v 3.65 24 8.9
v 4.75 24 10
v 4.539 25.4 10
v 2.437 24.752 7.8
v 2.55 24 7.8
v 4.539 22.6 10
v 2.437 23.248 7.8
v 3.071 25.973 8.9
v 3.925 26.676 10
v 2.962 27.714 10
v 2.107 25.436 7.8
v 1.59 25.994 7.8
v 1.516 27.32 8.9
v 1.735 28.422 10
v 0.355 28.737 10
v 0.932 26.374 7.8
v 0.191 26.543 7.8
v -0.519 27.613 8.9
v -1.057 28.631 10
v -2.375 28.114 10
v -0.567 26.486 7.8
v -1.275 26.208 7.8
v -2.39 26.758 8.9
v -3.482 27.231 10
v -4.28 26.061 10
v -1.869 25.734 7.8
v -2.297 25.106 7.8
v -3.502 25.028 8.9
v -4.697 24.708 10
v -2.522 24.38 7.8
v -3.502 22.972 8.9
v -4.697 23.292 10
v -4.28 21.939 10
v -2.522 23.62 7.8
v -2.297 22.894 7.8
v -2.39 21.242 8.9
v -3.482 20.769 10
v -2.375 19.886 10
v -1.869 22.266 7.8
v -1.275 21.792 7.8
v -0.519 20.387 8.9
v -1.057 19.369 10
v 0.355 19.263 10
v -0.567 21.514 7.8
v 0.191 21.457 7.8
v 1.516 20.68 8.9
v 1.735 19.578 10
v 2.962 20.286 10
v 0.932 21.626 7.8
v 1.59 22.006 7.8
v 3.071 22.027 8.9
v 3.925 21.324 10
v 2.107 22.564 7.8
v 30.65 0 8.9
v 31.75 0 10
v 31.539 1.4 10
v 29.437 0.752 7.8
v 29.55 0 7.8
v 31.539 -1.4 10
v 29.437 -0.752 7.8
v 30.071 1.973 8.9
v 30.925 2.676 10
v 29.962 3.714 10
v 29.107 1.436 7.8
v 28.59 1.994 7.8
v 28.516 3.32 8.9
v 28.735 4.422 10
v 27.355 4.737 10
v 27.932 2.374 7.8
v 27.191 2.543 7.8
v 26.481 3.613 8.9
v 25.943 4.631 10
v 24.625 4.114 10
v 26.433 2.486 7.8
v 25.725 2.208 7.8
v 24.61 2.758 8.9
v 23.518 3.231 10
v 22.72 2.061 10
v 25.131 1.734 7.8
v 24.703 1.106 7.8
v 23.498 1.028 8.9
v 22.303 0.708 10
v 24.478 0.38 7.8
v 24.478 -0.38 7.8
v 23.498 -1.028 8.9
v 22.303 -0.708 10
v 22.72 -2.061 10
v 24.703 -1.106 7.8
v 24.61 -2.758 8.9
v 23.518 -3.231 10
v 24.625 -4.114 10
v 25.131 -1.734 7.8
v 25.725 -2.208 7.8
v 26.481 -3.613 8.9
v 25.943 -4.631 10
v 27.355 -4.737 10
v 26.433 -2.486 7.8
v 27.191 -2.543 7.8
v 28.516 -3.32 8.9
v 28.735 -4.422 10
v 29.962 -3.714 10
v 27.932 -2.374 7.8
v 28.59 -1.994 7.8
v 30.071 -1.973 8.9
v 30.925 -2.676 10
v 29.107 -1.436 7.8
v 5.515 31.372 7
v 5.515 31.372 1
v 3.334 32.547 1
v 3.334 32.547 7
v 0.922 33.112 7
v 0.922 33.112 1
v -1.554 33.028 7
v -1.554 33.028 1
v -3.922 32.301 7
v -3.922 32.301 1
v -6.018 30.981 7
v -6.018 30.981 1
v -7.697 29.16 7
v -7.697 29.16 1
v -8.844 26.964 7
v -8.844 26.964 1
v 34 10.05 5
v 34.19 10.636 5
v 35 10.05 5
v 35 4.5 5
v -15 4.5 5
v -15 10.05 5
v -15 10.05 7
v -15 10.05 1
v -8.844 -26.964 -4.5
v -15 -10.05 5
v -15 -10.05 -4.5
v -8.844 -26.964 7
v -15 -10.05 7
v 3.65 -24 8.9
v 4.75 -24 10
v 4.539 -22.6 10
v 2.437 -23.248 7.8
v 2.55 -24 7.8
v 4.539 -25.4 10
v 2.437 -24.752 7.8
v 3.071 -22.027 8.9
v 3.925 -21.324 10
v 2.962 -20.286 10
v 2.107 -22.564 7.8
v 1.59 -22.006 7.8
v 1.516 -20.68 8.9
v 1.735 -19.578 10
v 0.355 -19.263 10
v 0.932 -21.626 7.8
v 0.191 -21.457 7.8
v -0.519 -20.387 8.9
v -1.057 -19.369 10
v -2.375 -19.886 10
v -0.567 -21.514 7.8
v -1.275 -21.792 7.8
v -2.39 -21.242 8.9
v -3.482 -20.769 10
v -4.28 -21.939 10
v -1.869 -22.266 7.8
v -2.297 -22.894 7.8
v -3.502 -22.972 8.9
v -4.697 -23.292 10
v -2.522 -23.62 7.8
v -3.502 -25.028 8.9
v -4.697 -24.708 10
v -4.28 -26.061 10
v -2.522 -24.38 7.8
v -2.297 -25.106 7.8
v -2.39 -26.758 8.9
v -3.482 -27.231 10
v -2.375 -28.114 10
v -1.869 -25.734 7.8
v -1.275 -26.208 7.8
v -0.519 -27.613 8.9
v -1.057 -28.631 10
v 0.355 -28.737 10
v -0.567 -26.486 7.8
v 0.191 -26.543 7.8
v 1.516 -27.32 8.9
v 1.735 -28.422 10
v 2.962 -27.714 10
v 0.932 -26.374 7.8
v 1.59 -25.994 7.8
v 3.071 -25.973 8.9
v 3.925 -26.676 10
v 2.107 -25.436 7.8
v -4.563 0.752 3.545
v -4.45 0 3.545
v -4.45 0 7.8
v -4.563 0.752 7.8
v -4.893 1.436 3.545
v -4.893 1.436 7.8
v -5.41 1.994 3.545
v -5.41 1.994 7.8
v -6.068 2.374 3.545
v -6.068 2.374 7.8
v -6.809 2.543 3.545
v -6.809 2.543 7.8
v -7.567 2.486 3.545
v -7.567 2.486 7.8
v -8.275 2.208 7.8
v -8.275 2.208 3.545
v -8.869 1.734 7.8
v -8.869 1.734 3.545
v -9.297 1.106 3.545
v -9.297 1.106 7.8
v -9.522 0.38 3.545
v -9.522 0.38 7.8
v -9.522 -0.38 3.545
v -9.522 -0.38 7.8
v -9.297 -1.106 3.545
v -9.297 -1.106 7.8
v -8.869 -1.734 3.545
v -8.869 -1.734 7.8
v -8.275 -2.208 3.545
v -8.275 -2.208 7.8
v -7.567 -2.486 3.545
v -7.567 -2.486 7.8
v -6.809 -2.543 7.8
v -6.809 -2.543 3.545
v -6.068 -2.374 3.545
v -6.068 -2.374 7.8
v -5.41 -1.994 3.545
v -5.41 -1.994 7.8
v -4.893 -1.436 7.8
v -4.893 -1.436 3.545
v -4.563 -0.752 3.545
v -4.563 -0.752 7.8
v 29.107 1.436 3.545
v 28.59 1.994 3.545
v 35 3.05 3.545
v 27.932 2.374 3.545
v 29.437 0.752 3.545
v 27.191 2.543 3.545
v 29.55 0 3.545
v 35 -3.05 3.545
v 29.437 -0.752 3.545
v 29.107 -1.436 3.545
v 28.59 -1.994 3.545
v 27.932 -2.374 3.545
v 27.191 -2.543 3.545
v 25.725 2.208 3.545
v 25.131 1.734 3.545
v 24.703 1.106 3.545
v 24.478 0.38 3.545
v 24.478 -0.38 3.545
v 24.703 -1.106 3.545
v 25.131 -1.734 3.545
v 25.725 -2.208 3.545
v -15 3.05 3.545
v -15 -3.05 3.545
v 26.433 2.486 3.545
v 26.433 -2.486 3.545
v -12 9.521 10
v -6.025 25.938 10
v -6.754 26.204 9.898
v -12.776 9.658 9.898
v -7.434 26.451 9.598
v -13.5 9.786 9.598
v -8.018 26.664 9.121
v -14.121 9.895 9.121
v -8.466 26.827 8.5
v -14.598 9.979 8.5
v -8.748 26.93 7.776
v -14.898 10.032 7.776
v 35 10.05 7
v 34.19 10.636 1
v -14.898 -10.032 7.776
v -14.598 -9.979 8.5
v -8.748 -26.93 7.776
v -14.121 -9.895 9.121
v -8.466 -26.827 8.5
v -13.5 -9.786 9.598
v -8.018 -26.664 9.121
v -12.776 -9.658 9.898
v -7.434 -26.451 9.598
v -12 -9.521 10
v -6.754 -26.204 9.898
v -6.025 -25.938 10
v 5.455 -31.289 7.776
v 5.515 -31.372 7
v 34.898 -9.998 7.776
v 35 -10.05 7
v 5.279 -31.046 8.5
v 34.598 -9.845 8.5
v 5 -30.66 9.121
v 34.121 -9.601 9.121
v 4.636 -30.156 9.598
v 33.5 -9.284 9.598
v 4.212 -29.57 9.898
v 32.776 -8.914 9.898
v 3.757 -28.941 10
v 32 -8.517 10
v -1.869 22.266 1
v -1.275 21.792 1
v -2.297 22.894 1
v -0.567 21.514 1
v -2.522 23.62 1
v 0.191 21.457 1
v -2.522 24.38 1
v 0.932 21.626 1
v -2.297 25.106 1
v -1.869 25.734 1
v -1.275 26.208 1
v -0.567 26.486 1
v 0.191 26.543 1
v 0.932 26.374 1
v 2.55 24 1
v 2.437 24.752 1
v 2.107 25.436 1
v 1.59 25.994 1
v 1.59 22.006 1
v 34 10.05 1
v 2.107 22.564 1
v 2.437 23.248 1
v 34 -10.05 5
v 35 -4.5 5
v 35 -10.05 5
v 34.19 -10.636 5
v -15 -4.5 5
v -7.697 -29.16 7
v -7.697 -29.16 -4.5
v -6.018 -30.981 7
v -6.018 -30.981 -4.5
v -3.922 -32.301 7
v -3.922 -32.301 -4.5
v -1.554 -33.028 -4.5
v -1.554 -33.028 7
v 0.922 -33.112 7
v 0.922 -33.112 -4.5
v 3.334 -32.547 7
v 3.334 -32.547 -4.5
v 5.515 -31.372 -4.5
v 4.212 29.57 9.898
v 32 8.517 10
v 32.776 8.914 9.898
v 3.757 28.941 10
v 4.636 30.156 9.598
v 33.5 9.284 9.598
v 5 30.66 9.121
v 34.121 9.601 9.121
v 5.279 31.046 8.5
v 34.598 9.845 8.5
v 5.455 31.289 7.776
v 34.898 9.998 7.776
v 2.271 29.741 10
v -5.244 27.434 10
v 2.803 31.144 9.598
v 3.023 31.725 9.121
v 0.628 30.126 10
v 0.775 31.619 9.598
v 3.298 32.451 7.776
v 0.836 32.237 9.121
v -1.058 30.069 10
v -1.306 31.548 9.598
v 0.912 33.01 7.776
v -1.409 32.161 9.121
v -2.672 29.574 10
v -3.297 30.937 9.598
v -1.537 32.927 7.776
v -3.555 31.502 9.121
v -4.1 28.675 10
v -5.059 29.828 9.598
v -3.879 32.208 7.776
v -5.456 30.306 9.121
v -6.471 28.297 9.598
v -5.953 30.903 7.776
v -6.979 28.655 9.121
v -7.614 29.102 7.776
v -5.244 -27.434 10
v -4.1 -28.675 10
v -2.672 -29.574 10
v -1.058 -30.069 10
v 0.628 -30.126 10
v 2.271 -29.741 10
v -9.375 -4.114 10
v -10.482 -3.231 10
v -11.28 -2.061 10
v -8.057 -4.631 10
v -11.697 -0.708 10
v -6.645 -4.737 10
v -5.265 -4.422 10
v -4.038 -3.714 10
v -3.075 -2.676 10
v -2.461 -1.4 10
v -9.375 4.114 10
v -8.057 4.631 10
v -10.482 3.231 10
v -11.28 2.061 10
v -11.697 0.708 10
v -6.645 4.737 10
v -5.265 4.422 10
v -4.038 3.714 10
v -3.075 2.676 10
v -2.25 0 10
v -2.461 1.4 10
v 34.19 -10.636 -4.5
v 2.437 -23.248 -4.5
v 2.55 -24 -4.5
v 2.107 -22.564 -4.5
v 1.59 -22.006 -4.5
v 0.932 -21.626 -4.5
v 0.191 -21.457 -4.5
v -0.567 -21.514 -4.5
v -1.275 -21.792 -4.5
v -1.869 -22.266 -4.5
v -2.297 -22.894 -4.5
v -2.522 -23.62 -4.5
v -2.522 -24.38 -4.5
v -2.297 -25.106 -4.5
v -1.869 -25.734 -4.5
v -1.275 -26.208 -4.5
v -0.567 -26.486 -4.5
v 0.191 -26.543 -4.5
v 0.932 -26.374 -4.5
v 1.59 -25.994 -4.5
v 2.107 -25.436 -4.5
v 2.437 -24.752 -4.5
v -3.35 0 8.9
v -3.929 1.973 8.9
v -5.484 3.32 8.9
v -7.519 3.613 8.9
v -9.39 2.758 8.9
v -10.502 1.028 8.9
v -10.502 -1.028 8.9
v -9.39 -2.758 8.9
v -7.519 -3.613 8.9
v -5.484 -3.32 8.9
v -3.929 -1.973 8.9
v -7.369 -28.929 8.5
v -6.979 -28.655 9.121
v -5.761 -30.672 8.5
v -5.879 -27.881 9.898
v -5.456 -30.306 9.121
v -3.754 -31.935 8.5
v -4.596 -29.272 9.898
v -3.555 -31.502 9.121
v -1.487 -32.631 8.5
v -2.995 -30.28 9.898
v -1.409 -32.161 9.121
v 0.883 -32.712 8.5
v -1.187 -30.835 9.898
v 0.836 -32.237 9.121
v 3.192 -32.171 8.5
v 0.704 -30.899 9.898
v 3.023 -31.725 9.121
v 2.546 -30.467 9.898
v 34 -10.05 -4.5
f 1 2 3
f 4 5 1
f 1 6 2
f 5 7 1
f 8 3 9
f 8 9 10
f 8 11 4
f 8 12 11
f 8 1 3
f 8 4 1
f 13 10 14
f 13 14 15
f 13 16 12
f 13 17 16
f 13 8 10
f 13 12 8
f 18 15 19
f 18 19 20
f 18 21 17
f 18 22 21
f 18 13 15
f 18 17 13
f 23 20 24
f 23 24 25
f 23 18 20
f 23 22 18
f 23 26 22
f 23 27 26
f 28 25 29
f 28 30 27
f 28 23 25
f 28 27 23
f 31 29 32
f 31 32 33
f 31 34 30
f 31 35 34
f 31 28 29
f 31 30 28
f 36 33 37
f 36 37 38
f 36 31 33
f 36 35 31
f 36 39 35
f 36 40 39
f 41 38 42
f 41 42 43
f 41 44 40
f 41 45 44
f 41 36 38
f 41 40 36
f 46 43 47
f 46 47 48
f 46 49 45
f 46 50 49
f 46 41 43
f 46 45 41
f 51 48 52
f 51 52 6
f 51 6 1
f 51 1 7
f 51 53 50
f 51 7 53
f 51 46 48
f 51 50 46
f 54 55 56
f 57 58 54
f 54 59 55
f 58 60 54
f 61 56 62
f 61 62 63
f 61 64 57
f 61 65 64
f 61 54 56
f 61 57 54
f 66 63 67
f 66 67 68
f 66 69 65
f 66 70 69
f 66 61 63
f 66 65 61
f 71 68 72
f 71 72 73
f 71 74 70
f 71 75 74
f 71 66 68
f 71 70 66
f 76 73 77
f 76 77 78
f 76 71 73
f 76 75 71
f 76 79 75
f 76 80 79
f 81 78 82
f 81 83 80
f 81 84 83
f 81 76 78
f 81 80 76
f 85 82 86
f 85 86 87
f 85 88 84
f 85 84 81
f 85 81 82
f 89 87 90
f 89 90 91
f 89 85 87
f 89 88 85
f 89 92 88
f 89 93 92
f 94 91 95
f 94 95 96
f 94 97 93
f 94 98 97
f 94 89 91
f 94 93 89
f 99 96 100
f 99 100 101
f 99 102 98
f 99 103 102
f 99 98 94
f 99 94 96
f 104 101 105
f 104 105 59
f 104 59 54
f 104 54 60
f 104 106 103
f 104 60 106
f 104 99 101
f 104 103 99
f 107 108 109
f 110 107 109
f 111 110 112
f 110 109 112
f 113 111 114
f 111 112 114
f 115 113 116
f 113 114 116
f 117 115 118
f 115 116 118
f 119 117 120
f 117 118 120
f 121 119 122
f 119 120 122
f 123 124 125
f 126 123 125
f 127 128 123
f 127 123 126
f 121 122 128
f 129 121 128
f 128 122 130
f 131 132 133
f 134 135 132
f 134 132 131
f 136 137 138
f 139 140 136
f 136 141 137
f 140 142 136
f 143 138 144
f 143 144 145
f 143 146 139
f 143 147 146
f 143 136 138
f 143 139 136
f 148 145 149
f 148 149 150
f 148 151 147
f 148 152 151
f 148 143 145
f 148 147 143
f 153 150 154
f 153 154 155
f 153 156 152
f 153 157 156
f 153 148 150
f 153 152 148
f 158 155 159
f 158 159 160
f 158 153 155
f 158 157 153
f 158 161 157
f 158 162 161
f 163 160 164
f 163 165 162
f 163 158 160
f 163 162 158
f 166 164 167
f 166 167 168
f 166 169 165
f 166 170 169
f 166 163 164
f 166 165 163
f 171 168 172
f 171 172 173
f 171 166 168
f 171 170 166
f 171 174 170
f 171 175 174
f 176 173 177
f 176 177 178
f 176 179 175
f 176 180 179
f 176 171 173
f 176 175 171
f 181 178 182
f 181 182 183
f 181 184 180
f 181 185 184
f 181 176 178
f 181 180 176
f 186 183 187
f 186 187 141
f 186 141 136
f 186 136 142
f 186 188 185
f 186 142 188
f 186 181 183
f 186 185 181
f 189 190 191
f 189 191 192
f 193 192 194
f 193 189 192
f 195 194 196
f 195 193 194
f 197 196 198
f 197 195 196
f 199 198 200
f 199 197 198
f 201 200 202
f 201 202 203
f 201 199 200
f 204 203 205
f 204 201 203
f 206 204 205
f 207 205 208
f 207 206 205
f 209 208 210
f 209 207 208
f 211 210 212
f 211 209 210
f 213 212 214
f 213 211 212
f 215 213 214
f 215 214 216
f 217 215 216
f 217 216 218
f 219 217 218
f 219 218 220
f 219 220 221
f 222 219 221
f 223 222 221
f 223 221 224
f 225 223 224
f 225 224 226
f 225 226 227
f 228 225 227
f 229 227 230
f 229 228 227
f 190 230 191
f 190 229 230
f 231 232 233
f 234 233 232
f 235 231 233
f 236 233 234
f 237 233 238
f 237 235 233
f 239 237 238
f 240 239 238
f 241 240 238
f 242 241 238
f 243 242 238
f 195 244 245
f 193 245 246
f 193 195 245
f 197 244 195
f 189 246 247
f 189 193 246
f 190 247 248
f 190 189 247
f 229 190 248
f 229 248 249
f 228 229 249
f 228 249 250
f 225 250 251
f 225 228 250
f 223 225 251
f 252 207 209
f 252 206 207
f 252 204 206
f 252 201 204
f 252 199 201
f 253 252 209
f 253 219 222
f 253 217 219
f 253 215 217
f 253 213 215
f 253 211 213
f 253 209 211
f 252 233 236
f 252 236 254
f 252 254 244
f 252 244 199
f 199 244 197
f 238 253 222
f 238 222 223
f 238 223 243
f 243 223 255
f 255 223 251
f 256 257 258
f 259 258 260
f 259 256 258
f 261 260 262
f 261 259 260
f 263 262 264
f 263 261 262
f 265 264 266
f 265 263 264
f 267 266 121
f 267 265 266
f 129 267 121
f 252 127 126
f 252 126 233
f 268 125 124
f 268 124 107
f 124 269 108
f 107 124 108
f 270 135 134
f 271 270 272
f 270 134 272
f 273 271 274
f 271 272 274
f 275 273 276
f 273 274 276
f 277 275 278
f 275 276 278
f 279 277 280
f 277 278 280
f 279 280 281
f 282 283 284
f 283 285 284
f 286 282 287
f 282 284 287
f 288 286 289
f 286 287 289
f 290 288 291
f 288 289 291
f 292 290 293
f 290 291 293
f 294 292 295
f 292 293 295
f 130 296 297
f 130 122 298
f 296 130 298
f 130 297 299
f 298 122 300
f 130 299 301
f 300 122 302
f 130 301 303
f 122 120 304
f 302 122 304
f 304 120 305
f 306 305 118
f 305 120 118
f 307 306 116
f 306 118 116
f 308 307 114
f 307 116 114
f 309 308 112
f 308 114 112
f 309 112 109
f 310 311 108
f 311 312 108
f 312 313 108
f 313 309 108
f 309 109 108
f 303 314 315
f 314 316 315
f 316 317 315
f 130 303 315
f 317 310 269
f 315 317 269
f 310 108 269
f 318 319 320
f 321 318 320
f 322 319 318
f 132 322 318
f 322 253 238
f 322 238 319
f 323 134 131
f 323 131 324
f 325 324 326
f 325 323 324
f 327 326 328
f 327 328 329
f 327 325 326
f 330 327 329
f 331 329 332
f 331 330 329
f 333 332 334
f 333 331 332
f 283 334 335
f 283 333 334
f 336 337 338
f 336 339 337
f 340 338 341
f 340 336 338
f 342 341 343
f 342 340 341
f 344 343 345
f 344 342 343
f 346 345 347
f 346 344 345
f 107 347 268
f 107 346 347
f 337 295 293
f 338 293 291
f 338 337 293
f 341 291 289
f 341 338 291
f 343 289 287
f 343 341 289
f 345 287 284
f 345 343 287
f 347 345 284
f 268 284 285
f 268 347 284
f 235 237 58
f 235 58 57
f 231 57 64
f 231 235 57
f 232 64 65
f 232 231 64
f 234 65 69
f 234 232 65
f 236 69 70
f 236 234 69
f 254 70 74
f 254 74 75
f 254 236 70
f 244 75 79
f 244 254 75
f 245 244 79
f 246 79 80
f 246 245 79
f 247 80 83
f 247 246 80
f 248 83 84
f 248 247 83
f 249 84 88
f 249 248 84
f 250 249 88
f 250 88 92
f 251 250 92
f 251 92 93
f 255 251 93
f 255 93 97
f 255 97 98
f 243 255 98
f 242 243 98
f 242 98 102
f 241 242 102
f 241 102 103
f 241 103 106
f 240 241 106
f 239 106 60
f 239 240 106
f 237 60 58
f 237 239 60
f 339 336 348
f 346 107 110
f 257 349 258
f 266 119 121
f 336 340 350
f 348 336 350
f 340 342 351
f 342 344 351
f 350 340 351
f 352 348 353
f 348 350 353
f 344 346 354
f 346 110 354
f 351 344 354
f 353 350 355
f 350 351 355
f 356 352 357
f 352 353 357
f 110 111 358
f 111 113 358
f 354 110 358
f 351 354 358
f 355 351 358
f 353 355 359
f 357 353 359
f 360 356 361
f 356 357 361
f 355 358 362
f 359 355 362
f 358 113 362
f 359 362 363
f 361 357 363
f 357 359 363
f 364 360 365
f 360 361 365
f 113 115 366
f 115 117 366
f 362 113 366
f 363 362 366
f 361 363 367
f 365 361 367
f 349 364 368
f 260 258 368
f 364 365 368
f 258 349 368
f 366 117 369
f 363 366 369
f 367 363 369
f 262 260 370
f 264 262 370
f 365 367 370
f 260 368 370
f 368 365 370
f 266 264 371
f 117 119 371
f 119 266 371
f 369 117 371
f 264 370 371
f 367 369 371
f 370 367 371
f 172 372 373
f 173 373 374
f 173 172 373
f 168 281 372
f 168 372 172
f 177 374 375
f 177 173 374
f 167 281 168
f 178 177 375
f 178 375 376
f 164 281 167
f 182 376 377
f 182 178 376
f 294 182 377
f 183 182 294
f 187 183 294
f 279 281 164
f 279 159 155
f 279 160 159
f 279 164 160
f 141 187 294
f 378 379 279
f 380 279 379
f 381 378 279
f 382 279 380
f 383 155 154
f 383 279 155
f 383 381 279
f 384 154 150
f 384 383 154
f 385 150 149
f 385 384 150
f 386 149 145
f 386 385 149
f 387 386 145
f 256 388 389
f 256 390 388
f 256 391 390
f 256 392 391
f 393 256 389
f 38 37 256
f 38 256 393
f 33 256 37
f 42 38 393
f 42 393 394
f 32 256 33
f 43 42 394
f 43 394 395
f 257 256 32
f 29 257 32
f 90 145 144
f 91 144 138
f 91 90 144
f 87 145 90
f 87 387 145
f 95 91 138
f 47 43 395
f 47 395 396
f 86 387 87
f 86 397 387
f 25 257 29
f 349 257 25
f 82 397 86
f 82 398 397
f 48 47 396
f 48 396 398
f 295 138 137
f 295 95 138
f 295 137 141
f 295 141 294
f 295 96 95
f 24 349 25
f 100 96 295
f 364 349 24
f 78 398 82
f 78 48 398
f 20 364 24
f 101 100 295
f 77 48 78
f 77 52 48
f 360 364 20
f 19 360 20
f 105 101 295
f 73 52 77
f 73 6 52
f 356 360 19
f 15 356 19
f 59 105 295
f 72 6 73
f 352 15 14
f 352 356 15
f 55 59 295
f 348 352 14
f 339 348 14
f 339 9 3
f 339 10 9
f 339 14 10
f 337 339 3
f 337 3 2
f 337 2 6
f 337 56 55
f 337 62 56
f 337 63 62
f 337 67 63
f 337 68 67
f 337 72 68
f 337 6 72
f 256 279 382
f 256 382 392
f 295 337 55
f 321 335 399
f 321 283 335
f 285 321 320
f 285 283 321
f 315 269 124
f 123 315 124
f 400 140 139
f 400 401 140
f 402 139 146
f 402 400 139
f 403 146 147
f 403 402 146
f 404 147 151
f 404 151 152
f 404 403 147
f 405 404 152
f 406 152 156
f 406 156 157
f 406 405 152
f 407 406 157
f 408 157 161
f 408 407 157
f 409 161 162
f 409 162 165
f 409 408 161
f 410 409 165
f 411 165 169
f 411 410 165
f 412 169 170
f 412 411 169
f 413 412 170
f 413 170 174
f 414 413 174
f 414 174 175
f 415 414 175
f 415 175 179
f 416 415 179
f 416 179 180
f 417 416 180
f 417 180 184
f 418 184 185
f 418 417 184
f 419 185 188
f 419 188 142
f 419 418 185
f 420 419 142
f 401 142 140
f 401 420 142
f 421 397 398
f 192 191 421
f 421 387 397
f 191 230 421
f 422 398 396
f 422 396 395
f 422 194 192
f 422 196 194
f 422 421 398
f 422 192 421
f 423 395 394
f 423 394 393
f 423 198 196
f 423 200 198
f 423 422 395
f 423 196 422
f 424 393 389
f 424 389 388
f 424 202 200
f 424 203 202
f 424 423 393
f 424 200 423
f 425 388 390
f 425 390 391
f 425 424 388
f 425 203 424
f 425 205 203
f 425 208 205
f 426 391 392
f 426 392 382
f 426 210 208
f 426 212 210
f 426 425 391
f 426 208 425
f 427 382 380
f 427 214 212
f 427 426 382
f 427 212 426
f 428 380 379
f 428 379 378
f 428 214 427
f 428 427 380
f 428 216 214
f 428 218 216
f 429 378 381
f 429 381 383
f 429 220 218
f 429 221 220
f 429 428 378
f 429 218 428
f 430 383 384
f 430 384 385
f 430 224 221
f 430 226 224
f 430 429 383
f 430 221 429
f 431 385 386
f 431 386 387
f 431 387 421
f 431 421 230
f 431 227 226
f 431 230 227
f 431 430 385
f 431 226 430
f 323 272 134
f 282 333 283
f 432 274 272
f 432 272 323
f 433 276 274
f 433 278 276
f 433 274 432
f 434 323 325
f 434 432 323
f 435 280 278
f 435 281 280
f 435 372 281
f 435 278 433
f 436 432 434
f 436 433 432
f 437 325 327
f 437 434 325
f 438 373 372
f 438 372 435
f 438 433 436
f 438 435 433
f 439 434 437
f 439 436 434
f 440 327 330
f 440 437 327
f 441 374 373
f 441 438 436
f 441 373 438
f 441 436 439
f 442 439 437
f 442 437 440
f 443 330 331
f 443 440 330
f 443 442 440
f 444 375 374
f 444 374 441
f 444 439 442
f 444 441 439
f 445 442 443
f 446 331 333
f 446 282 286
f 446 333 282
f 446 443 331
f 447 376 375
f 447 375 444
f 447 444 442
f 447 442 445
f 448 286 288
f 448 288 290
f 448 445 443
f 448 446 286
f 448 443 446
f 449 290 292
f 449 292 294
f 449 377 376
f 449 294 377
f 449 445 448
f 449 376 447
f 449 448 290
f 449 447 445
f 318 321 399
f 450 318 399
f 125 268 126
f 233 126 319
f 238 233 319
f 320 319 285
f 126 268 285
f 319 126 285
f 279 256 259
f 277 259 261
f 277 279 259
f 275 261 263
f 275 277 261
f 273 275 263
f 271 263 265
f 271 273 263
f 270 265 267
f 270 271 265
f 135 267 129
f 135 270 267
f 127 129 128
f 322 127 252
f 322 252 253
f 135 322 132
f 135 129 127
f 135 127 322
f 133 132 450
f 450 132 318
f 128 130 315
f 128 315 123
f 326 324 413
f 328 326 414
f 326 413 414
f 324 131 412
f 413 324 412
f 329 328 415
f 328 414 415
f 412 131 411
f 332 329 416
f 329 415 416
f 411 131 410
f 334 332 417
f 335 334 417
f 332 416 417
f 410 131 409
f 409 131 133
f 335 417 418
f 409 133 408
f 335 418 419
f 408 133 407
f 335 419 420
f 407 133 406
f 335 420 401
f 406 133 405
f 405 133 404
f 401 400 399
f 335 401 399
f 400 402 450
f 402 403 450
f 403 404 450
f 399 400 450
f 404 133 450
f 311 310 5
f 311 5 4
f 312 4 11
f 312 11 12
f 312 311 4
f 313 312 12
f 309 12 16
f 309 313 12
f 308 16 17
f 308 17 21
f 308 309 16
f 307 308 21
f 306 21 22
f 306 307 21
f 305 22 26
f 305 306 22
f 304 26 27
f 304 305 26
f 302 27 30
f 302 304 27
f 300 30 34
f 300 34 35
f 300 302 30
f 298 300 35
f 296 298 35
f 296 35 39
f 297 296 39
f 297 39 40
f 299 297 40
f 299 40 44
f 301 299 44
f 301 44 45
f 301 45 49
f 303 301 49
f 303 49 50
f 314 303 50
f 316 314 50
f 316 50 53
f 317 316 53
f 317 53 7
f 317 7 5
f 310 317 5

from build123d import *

# Parameters (mm, degrees)
F0_R     = 2.55
F1_DEPTH = 10
F2_W     = 20.1
F2_H     = 5
F3_DEPTH = 50.001
F5_DEPTH = 50
F6_DEPTH = 10
F7_DEPTH = 4.5
F8_DEPTH = 1
F9_R     = 3
F10_SIZE = 2.2
F11_SIZE = 1


# Not quite as in the source:
# - a feature names something its author has since deleted; it is built from what else it names


with BuildPart() as f1:
    # F0 (on Top) → F1 (new body)
    with BuildSketch(Plane.XY):
        with BuildLine():
            Line((-8.8436374201, 26.9644671741), (-15, 10.05))
            Line((-15, 10.05), (-15, -10.05))
            Line((-15, -10.05), (-8.8436374201, -26.9644671741))
            ThreePointArc((-8.8436374201, -26.9644671741), (-2.7616213035, -32.7425446245), (5.5147415904, -31.3718089411))
            Line((5.5147415904, -31.3718089411), (35, -10.05))
            Line((35, -10.05), (35, 10.05))
            Line((35, 10.05), (5.5147415904, 31.3718089411))
            ThreePointArc((5.5147415904, 31.3718089411), (-2.7616213035, 32.7425446245), (-8.8436374201, 26.9644671741))
        make_face()
        with Locations((0, -24)):
            Circle(F0_R, mode=Mode.SUBTRACT)
        with Locations((-7, 0)):
            Circle(F0_R, mode=Mode.SUBTRACT)
        with Locations((0, 24)):
            Circle(F0_R, mode=Mode.SUBTRACT)
        with Locations((27, 0)):
            Circle(F0_R, mode=Mode.SUBTRACT)
    extrude(amount=F1_DEPTH)

    # F2 (on face) → F3 (cut, through all)
    with BuildSketch(Plane(origin=(-15, 0, 0), x_dir=(0, -1, 0), z_dir=(-1, 0, 0))):
        with Locations((0, 2.5)):
            Rectangle(F2_W, F2_H)
    extrude(amount=-F3_DEPTH, mode=Mode.SUBTRACT)

    # F4 (on face) → F5 (join, through all)
    with BuildSketch(Plane(origin=(-15, 0, 0), x_dir=(0, -1, 0), z_dir=(-1, 0, 0))):
        Polygon((3.05, 3.545), (4.5, 5), (-4.5, 5), (-3.05, 3.545), align=None)
    extrude(amount=-F5_DEPTH)

    # F0 (on Top) → F6 (cut, through all)
    with BuildSketch(Plane.XY):
        with Locations((-7, 0)):
            Circle(F0_R)
        with Locations((27, 0)):
            Circle(F0_R)
    extrude(amount=F6_DEPTH, mode=Mode.SUBTRACT)

    # F7 (add): a face of the model
    f7_faces = [f1.faces().sort_by_distance(p)[0] for p in [
        (5.7473624585, -18.668206632, 0),
    ]]
    extrude(f7_faces, amount=F7_DEPTH)

    # F8 (cut): a face of the model
    f8_faces = [f1.faces().sort_by_distance(p)[0] for p in [
        (5.7473624585, 18.668206632, 0),
    ]]
    extrude(f8_faces, amount=-F8_DEPTH, mode=Mode.SUBTRACT)

    # F9
    f9_edges = [f1.edges().sort_by_distance(p)[0] for p in [
        (-11.921819, 18.507234, 10),
        (-15, 0, 10),
        (-11.921819, -18.507234, 10),
        (35, 0, 10),
        (-2.761621, 32.742545, 10),
        (-2.761621, -32.742545, 10),
        (20.257371, -20.710904, 10),
        (20.257371, 20.710904, 10),
    ]]
    fillet(f9_edges, radius=F9_R)

    # F10
    f10_edges = [f1.edges().sort_by_distance(p)[0] for p in [
        (-2.55, -24, 10),
        (-9.55, 0, 10),
        (-2.55, 24, 10),
        (24.45, 0, 10),
    ]]
    chamfer(f10_edges, length=F10_SIZE)

    # F11
    f11_edges = [f1.edges().sort_by_distance(p)[0] for p in [
        (35, 10.05, 3),
        (5.514742, -31.371809, 1.25),
        (35, -10.05, 0.25),
    ]]
    chamfer(f11_edges, length=F11_SIZE)


solid = f1.part
